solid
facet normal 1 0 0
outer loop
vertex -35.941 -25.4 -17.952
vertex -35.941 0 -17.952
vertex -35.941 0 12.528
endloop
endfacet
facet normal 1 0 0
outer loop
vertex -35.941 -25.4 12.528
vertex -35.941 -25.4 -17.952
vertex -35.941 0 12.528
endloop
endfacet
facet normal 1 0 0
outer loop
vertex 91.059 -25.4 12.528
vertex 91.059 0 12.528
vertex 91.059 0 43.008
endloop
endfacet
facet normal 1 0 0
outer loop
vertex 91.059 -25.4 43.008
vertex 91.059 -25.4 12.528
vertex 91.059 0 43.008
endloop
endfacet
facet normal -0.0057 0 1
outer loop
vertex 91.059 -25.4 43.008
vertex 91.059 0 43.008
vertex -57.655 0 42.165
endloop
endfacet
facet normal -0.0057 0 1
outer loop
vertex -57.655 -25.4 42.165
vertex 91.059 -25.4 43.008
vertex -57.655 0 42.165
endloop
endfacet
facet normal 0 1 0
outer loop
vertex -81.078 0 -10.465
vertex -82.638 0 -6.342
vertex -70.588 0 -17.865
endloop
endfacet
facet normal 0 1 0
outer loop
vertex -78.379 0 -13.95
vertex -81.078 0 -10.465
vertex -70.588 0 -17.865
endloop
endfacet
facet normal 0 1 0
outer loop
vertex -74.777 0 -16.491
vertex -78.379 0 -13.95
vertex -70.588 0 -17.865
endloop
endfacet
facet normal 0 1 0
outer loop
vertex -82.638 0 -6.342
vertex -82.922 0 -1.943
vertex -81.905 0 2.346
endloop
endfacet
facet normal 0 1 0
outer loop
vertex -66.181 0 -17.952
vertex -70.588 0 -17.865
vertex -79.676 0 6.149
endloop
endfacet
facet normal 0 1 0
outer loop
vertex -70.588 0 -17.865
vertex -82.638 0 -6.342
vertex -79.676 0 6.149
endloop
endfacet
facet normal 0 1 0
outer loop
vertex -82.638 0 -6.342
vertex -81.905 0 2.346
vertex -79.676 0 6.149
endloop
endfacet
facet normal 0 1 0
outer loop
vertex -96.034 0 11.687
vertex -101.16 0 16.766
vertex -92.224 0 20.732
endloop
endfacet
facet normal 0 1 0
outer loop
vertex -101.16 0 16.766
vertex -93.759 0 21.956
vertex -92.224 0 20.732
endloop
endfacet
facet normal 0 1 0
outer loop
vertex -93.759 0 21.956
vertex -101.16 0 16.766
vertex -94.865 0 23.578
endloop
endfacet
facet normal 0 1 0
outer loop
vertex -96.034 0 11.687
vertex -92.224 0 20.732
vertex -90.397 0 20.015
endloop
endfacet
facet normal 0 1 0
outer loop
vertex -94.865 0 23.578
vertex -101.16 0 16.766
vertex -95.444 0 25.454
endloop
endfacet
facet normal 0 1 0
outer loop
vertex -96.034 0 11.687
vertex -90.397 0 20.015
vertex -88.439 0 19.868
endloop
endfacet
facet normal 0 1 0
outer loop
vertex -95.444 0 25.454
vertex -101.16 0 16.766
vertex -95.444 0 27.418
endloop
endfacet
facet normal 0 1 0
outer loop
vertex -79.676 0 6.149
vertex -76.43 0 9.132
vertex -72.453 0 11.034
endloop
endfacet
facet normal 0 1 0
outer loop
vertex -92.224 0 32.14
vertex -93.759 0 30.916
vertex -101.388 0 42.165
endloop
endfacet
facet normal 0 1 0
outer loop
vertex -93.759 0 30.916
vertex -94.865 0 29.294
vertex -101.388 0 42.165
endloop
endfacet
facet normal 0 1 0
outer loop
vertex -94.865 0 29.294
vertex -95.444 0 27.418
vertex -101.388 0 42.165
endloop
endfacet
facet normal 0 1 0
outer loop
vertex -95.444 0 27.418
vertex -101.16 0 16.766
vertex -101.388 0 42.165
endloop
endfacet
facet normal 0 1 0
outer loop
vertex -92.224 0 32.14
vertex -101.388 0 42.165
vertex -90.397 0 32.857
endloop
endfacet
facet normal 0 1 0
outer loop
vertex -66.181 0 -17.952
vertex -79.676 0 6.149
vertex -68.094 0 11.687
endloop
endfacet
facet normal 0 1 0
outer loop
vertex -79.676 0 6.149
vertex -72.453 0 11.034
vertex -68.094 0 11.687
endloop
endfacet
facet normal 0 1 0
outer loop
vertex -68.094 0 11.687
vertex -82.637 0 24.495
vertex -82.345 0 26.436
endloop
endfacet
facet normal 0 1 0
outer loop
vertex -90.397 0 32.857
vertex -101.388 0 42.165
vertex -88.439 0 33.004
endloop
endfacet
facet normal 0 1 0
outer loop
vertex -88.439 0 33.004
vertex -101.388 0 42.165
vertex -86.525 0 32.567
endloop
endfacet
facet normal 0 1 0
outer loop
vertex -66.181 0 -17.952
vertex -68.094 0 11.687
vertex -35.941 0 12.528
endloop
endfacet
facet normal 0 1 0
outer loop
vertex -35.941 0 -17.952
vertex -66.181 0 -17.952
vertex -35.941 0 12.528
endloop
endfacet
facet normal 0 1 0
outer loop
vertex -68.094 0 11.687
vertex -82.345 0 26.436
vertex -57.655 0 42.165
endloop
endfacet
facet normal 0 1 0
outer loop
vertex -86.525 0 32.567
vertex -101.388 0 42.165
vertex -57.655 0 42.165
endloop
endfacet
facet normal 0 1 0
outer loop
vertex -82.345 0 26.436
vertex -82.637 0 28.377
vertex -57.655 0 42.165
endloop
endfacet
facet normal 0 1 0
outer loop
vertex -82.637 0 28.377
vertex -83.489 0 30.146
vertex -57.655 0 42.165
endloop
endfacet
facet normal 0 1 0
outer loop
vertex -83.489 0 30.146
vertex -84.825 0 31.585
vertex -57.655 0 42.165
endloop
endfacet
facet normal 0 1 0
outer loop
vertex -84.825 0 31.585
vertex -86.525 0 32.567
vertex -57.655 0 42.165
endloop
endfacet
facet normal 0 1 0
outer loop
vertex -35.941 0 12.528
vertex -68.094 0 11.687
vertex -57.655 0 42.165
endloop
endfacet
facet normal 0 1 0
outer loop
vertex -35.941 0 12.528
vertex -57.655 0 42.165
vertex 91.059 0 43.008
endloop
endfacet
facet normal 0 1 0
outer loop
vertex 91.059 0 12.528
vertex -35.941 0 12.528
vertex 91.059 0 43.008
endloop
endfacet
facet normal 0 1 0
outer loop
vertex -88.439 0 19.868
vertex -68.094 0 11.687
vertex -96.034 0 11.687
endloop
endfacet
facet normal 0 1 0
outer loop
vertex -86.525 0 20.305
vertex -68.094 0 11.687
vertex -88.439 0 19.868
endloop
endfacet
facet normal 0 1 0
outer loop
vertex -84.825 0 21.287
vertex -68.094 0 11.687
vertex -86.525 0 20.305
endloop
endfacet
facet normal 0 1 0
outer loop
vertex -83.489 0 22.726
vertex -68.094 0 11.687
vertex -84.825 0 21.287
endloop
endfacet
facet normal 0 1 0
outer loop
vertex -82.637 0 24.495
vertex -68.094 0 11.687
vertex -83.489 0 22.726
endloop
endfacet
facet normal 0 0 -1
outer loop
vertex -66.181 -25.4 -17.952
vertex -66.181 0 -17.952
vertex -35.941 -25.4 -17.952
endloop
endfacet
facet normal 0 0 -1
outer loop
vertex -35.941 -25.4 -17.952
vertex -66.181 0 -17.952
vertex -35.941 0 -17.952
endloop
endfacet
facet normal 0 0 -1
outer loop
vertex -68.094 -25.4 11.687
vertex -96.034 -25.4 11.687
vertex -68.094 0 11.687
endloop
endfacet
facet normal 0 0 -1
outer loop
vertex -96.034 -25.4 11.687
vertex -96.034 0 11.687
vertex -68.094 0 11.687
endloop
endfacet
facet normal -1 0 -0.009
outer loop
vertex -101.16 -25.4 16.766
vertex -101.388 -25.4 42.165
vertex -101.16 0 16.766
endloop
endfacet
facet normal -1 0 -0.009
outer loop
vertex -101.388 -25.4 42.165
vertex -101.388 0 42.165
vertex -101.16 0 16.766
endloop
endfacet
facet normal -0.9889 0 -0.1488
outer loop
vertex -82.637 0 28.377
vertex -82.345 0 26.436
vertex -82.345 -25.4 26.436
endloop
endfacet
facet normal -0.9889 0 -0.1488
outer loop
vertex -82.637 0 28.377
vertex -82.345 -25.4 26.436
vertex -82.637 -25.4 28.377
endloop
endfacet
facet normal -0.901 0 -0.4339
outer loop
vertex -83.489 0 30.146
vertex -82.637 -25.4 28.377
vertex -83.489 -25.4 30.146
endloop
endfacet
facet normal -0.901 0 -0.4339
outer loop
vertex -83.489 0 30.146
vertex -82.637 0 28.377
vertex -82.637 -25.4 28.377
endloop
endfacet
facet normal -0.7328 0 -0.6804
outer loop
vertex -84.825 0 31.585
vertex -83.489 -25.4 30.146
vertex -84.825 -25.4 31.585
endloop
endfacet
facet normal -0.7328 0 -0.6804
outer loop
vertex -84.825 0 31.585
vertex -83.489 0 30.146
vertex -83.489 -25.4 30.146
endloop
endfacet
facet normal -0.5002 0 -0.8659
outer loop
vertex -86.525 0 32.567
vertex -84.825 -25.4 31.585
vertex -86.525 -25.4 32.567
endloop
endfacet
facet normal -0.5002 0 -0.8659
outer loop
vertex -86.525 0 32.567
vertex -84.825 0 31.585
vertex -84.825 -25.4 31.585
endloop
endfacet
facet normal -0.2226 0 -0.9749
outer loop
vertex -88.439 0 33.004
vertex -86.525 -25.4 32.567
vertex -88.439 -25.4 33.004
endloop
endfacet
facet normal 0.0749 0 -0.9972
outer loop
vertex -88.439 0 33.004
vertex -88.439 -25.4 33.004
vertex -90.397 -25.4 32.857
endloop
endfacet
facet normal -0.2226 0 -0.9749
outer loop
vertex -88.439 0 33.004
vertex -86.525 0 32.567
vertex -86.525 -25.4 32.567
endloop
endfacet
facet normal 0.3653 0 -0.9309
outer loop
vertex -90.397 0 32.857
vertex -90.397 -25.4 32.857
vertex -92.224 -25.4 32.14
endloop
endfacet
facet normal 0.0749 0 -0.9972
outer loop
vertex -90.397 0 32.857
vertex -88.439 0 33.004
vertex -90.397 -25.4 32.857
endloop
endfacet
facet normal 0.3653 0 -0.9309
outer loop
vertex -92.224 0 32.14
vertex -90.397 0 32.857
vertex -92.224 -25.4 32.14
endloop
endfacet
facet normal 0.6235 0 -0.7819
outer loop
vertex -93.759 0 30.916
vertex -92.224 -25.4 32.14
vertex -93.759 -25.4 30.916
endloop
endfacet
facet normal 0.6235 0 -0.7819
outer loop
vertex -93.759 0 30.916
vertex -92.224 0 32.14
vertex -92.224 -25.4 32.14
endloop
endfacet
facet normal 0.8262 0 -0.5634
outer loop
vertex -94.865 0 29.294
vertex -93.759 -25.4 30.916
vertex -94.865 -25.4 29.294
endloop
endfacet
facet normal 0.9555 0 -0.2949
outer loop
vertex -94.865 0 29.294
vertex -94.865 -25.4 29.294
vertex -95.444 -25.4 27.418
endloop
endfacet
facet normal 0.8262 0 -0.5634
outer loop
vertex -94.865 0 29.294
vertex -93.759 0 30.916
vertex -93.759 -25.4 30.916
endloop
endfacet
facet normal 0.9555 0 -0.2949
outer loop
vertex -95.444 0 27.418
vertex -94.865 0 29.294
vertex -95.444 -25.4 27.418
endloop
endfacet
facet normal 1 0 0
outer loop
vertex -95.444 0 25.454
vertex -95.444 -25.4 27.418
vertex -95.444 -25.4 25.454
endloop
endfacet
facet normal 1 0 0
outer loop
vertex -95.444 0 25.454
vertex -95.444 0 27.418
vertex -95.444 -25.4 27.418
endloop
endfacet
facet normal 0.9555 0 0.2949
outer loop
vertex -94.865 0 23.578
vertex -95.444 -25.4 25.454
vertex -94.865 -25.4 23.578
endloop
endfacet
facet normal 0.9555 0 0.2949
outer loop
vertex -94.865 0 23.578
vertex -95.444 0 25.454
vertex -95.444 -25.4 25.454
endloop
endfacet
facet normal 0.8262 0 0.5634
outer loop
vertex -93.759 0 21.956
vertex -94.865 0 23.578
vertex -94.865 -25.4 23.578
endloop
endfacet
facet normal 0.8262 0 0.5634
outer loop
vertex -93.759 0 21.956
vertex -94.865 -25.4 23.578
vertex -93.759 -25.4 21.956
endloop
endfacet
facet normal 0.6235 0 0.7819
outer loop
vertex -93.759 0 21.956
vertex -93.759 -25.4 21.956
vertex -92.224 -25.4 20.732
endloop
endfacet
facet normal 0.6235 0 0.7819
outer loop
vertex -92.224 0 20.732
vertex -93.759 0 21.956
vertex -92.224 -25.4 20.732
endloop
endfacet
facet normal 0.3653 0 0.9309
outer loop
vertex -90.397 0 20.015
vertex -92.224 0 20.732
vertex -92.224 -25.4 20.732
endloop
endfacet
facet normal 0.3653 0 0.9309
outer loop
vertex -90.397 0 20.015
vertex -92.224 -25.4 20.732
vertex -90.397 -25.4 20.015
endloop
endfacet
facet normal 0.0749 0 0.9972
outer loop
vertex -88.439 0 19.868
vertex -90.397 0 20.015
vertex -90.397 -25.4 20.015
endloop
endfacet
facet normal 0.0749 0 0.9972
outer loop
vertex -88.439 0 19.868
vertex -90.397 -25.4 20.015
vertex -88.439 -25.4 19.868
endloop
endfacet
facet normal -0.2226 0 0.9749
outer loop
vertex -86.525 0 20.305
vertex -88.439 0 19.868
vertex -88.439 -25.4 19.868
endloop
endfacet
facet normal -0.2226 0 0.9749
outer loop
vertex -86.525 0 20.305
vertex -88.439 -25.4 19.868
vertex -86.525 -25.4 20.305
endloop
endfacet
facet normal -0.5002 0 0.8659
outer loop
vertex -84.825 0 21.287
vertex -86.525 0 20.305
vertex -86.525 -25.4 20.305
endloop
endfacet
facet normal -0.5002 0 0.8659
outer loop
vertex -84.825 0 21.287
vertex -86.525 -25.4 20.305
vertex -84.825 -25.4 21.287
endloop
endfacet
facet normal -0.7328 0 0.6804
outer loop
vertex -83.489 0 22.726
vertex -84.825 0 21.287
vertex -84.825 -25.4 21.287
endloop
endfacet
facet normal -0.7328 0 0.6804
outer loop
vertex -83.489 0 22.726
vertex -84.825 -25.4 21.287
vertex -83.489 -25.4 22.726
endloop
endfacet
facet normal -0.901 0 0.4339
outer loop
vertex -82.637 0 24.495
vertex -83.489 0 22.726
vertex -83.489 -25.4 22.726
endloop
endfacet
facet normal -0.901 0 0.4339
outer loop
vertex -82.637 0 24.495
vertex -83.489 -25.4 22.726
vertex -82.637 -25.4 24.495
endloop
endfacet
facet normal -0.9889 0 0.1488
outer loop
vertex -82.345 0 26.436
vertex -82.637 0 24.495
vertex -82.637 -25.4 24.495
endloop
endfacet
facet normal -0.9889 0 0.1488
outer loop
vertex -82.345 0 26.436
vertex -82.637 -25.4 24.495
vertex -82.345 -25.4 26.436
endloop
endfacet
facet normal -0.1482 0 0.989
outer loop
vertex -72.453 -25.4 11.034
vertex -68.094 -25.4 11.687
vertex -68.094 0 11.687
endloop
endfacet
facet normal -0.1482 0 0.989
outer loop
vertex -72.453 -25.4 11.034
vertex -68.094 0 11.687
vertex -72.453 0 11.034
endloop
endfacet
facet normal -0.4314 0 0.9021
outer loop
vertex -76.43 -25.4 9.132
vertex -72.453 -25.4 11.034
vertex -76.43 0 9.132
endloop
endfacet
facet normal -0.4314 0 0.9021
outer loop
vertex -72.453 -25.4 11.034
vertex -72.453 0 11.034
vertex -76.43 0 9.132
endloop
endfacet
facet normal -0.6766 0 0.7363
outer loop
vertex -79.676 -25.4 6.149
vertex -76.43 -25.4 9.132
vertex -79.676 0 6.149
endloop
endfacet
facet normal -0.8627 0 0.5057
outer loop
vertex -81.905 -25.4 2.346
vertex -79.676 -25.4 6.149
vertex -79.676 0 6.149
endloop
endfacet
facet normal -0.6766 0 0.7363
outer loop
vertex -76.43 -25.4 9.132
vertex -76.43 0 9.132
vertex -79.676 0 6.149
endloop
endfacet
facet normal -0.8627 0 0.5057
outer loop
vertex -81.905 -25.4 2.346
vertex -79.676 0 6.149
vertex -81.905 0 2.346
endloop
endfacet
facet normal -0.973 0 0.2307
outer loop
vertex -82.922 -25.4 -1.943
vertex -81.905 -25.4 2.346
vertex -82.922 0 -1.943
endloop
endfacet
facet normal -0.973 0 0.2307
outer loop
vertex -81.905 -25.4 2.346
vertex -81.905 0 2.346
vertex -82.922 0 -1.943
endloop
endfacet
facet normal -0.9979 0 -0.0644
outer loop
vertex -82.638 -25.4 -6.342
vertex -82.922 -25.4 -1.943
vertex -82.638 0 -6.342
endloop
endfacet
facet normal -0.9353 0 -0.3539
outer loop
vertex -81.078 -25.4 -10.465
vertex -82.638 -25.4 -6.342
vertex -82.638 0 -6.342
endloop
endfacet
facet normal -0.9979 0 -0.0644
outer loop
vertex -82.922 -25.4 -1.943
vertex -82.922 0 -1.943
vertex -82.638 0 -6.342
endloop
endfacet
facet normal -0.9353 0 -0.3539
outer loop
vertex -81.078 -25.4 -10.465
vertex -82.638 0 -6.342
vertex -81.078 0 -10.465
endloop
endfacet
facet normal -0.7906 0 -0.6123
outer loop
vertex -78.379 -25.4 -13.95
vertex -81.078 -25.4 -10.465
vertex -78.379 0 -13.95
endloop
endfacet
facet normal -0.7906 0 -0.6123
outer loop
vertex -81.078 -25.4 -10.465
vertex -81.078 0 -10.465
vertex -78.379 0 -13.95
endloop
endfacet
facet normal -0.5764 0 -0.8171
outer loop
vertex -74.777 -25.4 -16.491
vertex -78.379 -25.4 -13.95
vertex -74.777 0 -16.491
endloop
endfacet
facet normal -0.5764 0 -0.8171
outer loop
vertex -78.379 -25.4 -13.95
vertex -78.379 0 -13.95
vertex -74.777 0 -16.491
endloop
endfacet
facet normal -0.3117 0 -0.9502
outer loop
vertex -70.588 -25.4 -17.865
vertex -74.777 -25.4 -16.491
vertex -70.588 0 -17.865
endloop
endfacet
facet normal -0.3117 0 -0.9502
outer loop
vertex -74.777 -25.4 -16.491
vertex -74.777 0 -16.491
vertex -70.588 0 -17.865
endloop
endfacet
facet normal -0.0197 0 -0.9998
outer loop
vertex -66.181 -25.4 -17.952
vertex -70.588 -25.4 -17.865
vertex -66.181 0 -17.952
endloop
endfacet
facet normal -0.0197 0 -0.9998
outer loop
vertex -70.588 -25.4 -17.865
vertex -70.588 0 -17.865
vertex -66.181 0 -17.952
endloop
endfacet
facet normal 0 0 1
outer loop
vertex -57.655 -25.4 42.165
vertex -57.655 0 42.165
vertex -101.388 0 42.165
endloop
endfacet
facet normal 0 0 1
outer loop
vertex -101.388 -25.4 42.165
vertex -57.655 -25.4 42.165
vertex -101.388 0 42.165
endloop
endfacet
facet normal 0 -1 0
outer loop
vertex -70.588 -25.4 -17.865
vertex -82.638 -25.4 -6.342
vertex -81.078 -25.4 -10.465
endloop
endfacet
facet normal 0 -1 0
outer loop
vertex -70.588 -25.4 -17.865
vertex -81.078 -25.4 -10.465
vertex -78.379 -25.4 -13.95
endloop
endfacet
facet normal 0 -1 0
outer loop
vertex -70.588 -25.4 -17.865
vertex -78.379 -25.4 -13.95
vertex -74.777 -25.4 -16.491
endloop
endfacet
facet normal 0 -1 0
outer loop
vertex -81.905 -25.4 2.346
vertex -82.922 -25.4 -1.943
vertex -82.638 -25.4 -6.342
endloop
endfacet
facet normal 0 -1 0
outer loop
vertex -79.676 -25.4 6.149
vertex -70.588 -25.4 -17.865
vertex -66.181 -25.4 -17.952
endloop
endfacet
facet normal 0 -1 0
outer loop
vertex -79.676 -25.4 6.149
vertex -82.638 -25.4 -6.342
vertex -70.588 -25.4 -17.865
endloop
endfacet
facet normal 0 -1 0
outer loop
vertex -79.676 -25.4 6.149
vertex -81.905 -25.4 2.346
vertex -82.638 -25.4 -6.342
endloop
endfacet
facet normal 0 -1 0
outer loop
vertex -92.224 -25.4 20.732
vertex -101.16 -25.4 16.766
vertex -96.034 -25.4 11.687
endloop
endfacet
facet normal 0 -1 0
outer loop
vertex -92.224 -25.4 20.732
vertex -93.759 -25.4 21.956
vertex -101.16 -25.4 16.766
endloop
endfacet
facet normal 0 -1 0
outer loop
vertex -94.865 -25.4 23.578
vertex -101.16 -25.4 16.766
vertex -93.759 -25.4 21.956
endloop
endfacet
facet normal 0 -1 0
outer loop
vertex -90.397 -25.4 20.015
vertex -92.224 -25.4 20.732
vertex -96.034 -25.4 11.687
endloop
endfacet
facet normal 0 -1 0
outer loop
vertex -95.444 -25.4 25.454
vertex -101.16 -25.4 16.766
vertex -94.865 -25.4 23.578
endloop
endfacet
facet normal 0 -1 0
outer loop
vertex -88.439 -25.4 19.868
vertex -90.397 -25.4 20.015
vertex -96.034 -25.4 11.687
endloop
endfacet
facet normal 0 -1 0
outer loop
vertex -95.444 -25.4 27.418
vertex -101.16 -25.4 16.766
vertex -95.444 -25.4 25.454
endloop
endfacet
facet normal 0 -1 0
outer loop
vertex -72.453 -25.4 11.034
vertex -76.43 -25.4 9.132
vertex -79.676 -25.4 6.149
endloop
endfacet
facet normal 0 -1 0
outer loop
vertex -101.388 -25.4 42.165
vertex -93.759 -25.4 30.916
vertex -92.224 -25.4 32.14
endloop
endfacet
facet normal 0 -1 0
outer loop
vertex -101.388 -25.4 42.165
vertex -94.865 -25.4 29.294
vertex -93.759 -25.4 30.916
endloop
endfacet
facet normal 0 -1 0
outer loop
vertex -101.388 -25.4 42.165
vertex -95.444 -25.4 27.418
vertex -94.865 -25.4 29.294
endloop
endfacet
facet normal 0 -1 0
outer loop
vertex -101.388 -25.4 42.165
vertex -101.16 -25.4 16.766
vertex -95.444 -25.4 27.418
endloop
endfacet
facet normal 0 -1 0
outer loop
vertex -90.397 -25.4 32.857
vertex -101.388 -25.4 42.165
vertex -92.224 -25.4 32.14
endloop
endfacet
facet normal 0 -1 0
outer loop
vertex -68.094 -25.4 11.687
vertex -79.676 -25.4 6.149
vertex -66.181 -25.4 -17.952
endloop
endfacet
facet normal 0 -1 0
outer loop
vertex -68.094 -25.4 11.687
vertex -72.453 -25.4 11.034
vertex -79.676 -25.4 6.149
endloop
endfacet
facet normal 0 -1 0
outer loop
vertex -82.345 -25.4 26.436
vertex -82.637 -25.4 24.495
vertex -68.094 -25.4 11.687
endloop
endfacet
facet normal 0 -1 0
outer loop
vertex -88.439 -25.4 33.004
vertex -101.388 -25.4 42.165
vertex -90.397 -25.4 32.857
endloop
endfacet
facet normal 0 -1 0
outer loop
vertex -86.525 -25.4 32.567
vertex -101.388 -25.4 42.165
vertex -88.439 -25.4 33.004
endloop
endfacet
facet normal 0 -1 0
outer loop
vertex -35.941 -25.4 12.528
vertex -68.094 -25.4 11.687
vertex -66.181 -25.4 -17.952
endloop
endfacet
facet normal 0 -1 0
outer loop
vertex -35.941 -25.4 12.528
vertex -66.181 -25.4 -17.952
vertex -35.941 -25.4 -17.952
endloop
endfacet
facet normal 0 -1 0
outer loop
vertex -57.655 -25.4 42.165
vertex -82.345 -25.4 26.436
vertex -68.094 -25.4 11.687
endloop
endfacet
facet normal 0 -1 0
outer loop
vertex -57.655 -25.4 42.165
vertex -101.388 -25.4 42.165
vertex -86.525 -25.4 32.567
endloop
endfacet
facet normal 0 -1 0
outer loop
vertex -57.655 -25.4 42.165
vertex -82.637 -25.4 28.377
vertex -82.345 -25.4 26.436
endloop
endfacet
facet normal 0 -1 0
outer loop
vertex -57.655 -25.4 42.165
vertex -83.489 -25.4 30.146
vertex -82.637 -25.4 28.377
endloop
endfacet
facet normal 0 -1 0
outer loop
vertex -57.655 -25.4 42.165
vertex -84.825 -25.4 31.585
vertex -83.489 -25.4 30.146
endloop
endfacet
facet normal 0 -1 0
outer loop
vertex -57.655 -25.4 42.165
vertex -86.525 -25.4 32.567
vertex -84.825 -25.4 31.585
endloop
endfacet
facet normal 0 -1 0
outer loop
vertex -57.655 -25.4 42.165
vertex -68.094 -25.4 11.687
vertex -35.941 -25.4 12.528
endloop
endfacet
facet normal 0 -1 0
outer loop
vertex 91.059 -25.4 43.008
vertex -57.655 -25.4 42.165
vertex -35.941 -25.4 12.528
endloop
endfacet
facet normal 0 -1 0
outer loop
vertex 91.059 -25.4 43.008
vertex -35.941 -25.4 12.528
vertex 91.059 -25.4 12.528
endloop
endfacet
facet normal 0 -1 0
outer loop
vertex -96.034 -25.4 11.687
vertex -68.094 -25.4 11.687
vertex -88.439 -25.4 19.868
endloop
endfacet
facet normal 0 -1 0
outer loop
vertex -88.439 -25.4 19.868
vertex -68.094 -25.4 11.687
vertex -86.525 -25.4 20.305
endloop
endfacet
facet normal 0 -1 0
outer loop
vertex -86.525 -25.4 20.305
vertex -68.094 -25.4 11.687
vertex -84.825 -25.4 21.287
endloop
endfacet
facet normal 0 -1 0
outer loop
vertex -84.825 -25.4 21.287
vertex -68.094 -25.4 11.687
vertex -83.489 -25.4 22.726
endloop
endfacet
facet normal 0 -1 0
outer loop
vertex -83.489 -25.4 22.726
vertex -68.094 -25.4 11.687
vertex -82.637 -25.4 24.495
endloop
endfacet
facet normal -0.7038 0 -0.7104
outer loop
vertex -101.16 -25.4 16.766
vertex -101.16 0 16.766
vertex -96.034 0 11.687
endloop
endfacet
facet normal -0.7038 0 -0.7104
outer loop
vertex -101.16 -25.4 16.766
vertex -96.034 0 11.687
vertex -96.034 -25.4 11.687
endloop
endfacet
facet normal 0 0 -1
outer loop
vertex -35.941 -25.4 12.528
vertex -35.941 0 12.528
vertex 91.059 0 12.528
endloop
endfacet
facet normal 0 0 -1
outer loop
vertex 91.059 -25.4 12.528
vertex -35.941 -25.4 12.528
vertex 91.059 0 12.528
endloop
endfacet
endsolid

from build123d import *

# Parameters (mm, degrees)
F0_R     = 6.58625
F1_DEPTH = 21.082
F2_DEPTH = 25.4
F3_SIZE  = 5.08


with BuildPart() as f1:
    # F0 (on Front) → F1 (new body)
    with BuildSketch(Plane.XZ):
        with BuildLine():
            Line((91.058975, 12.527699), (91.058975, 43.007699))
            Line((91.058975, 43.007699), (-57.654542, 42.165341))
            Line((-57.654542, 42.165341), (-101.388322, 42.165341))
            Line((-101.388322, 42.165341), (-101.113739, 11.686578))
            Line((-101.113739, 11.686578), (-68.093739, 11.686578))
            ThreePointArc((-68.093739, 11.686578), (-82.944012, -4.153037), (-66.180828, -17.952301))
            Line((-66.180828, -17.952301), (-35.941025, -17.952301))
            Line((-35.941025, -17.952301), (-35.941025, 12.527699))
            Line((-35.941025, 12.527699), (91.058975, 12.527699))
        make_face()
        with Locations((-88.930964, 26.435958)):
            Circle(F0_R, mode=Mode.SUBTRACT)
    extrude(amount=F1_DEPTH)

    # F0 (on Front) → F2 (join)
    with BuildSketch(Plane.XZ):
        with BuildLine():
            Line((91.058975, 12.527699), (91.058975, 43.007699))
            Line((91.058975, 43.007699), (-57.654542, 42.165341))
            Line((-57.654542, 42.165341), (-101.388322, 42.165341))
            Line((-101.388322, 42.165341), (-101.113739, 11.686578))
            Line((-101.113739, 11.686578), (-68.093739, 11.686578))
            ThreePointArc((-68.093739, 11.686578), (-82.944012, -4.153037), (-66.180828, -17.952301))
            Line((-66.180828, -17.952301), (-35.941025, -17.952301))
            Line((-35.941025, -17.952301), (-35.941025, 12.527699))
            Line((-35.941025, 12.527699), (91.058975, 12.527699))
        make_face()
        with Locations((-88.930964, 26.435958)):
            Circle(F0_R, mode=Mode.SUBTRACT)
    extrude(amount=F2_DEPTH)

    # F3
    f3_edges = [f1.edges().sort_by_distance(p)[0] for p in [
        (-101.113739, -12.7, 11.686578),
    ]]
    chamfer(f3_edges, length=F3_SIZE)


solid = f1.part
